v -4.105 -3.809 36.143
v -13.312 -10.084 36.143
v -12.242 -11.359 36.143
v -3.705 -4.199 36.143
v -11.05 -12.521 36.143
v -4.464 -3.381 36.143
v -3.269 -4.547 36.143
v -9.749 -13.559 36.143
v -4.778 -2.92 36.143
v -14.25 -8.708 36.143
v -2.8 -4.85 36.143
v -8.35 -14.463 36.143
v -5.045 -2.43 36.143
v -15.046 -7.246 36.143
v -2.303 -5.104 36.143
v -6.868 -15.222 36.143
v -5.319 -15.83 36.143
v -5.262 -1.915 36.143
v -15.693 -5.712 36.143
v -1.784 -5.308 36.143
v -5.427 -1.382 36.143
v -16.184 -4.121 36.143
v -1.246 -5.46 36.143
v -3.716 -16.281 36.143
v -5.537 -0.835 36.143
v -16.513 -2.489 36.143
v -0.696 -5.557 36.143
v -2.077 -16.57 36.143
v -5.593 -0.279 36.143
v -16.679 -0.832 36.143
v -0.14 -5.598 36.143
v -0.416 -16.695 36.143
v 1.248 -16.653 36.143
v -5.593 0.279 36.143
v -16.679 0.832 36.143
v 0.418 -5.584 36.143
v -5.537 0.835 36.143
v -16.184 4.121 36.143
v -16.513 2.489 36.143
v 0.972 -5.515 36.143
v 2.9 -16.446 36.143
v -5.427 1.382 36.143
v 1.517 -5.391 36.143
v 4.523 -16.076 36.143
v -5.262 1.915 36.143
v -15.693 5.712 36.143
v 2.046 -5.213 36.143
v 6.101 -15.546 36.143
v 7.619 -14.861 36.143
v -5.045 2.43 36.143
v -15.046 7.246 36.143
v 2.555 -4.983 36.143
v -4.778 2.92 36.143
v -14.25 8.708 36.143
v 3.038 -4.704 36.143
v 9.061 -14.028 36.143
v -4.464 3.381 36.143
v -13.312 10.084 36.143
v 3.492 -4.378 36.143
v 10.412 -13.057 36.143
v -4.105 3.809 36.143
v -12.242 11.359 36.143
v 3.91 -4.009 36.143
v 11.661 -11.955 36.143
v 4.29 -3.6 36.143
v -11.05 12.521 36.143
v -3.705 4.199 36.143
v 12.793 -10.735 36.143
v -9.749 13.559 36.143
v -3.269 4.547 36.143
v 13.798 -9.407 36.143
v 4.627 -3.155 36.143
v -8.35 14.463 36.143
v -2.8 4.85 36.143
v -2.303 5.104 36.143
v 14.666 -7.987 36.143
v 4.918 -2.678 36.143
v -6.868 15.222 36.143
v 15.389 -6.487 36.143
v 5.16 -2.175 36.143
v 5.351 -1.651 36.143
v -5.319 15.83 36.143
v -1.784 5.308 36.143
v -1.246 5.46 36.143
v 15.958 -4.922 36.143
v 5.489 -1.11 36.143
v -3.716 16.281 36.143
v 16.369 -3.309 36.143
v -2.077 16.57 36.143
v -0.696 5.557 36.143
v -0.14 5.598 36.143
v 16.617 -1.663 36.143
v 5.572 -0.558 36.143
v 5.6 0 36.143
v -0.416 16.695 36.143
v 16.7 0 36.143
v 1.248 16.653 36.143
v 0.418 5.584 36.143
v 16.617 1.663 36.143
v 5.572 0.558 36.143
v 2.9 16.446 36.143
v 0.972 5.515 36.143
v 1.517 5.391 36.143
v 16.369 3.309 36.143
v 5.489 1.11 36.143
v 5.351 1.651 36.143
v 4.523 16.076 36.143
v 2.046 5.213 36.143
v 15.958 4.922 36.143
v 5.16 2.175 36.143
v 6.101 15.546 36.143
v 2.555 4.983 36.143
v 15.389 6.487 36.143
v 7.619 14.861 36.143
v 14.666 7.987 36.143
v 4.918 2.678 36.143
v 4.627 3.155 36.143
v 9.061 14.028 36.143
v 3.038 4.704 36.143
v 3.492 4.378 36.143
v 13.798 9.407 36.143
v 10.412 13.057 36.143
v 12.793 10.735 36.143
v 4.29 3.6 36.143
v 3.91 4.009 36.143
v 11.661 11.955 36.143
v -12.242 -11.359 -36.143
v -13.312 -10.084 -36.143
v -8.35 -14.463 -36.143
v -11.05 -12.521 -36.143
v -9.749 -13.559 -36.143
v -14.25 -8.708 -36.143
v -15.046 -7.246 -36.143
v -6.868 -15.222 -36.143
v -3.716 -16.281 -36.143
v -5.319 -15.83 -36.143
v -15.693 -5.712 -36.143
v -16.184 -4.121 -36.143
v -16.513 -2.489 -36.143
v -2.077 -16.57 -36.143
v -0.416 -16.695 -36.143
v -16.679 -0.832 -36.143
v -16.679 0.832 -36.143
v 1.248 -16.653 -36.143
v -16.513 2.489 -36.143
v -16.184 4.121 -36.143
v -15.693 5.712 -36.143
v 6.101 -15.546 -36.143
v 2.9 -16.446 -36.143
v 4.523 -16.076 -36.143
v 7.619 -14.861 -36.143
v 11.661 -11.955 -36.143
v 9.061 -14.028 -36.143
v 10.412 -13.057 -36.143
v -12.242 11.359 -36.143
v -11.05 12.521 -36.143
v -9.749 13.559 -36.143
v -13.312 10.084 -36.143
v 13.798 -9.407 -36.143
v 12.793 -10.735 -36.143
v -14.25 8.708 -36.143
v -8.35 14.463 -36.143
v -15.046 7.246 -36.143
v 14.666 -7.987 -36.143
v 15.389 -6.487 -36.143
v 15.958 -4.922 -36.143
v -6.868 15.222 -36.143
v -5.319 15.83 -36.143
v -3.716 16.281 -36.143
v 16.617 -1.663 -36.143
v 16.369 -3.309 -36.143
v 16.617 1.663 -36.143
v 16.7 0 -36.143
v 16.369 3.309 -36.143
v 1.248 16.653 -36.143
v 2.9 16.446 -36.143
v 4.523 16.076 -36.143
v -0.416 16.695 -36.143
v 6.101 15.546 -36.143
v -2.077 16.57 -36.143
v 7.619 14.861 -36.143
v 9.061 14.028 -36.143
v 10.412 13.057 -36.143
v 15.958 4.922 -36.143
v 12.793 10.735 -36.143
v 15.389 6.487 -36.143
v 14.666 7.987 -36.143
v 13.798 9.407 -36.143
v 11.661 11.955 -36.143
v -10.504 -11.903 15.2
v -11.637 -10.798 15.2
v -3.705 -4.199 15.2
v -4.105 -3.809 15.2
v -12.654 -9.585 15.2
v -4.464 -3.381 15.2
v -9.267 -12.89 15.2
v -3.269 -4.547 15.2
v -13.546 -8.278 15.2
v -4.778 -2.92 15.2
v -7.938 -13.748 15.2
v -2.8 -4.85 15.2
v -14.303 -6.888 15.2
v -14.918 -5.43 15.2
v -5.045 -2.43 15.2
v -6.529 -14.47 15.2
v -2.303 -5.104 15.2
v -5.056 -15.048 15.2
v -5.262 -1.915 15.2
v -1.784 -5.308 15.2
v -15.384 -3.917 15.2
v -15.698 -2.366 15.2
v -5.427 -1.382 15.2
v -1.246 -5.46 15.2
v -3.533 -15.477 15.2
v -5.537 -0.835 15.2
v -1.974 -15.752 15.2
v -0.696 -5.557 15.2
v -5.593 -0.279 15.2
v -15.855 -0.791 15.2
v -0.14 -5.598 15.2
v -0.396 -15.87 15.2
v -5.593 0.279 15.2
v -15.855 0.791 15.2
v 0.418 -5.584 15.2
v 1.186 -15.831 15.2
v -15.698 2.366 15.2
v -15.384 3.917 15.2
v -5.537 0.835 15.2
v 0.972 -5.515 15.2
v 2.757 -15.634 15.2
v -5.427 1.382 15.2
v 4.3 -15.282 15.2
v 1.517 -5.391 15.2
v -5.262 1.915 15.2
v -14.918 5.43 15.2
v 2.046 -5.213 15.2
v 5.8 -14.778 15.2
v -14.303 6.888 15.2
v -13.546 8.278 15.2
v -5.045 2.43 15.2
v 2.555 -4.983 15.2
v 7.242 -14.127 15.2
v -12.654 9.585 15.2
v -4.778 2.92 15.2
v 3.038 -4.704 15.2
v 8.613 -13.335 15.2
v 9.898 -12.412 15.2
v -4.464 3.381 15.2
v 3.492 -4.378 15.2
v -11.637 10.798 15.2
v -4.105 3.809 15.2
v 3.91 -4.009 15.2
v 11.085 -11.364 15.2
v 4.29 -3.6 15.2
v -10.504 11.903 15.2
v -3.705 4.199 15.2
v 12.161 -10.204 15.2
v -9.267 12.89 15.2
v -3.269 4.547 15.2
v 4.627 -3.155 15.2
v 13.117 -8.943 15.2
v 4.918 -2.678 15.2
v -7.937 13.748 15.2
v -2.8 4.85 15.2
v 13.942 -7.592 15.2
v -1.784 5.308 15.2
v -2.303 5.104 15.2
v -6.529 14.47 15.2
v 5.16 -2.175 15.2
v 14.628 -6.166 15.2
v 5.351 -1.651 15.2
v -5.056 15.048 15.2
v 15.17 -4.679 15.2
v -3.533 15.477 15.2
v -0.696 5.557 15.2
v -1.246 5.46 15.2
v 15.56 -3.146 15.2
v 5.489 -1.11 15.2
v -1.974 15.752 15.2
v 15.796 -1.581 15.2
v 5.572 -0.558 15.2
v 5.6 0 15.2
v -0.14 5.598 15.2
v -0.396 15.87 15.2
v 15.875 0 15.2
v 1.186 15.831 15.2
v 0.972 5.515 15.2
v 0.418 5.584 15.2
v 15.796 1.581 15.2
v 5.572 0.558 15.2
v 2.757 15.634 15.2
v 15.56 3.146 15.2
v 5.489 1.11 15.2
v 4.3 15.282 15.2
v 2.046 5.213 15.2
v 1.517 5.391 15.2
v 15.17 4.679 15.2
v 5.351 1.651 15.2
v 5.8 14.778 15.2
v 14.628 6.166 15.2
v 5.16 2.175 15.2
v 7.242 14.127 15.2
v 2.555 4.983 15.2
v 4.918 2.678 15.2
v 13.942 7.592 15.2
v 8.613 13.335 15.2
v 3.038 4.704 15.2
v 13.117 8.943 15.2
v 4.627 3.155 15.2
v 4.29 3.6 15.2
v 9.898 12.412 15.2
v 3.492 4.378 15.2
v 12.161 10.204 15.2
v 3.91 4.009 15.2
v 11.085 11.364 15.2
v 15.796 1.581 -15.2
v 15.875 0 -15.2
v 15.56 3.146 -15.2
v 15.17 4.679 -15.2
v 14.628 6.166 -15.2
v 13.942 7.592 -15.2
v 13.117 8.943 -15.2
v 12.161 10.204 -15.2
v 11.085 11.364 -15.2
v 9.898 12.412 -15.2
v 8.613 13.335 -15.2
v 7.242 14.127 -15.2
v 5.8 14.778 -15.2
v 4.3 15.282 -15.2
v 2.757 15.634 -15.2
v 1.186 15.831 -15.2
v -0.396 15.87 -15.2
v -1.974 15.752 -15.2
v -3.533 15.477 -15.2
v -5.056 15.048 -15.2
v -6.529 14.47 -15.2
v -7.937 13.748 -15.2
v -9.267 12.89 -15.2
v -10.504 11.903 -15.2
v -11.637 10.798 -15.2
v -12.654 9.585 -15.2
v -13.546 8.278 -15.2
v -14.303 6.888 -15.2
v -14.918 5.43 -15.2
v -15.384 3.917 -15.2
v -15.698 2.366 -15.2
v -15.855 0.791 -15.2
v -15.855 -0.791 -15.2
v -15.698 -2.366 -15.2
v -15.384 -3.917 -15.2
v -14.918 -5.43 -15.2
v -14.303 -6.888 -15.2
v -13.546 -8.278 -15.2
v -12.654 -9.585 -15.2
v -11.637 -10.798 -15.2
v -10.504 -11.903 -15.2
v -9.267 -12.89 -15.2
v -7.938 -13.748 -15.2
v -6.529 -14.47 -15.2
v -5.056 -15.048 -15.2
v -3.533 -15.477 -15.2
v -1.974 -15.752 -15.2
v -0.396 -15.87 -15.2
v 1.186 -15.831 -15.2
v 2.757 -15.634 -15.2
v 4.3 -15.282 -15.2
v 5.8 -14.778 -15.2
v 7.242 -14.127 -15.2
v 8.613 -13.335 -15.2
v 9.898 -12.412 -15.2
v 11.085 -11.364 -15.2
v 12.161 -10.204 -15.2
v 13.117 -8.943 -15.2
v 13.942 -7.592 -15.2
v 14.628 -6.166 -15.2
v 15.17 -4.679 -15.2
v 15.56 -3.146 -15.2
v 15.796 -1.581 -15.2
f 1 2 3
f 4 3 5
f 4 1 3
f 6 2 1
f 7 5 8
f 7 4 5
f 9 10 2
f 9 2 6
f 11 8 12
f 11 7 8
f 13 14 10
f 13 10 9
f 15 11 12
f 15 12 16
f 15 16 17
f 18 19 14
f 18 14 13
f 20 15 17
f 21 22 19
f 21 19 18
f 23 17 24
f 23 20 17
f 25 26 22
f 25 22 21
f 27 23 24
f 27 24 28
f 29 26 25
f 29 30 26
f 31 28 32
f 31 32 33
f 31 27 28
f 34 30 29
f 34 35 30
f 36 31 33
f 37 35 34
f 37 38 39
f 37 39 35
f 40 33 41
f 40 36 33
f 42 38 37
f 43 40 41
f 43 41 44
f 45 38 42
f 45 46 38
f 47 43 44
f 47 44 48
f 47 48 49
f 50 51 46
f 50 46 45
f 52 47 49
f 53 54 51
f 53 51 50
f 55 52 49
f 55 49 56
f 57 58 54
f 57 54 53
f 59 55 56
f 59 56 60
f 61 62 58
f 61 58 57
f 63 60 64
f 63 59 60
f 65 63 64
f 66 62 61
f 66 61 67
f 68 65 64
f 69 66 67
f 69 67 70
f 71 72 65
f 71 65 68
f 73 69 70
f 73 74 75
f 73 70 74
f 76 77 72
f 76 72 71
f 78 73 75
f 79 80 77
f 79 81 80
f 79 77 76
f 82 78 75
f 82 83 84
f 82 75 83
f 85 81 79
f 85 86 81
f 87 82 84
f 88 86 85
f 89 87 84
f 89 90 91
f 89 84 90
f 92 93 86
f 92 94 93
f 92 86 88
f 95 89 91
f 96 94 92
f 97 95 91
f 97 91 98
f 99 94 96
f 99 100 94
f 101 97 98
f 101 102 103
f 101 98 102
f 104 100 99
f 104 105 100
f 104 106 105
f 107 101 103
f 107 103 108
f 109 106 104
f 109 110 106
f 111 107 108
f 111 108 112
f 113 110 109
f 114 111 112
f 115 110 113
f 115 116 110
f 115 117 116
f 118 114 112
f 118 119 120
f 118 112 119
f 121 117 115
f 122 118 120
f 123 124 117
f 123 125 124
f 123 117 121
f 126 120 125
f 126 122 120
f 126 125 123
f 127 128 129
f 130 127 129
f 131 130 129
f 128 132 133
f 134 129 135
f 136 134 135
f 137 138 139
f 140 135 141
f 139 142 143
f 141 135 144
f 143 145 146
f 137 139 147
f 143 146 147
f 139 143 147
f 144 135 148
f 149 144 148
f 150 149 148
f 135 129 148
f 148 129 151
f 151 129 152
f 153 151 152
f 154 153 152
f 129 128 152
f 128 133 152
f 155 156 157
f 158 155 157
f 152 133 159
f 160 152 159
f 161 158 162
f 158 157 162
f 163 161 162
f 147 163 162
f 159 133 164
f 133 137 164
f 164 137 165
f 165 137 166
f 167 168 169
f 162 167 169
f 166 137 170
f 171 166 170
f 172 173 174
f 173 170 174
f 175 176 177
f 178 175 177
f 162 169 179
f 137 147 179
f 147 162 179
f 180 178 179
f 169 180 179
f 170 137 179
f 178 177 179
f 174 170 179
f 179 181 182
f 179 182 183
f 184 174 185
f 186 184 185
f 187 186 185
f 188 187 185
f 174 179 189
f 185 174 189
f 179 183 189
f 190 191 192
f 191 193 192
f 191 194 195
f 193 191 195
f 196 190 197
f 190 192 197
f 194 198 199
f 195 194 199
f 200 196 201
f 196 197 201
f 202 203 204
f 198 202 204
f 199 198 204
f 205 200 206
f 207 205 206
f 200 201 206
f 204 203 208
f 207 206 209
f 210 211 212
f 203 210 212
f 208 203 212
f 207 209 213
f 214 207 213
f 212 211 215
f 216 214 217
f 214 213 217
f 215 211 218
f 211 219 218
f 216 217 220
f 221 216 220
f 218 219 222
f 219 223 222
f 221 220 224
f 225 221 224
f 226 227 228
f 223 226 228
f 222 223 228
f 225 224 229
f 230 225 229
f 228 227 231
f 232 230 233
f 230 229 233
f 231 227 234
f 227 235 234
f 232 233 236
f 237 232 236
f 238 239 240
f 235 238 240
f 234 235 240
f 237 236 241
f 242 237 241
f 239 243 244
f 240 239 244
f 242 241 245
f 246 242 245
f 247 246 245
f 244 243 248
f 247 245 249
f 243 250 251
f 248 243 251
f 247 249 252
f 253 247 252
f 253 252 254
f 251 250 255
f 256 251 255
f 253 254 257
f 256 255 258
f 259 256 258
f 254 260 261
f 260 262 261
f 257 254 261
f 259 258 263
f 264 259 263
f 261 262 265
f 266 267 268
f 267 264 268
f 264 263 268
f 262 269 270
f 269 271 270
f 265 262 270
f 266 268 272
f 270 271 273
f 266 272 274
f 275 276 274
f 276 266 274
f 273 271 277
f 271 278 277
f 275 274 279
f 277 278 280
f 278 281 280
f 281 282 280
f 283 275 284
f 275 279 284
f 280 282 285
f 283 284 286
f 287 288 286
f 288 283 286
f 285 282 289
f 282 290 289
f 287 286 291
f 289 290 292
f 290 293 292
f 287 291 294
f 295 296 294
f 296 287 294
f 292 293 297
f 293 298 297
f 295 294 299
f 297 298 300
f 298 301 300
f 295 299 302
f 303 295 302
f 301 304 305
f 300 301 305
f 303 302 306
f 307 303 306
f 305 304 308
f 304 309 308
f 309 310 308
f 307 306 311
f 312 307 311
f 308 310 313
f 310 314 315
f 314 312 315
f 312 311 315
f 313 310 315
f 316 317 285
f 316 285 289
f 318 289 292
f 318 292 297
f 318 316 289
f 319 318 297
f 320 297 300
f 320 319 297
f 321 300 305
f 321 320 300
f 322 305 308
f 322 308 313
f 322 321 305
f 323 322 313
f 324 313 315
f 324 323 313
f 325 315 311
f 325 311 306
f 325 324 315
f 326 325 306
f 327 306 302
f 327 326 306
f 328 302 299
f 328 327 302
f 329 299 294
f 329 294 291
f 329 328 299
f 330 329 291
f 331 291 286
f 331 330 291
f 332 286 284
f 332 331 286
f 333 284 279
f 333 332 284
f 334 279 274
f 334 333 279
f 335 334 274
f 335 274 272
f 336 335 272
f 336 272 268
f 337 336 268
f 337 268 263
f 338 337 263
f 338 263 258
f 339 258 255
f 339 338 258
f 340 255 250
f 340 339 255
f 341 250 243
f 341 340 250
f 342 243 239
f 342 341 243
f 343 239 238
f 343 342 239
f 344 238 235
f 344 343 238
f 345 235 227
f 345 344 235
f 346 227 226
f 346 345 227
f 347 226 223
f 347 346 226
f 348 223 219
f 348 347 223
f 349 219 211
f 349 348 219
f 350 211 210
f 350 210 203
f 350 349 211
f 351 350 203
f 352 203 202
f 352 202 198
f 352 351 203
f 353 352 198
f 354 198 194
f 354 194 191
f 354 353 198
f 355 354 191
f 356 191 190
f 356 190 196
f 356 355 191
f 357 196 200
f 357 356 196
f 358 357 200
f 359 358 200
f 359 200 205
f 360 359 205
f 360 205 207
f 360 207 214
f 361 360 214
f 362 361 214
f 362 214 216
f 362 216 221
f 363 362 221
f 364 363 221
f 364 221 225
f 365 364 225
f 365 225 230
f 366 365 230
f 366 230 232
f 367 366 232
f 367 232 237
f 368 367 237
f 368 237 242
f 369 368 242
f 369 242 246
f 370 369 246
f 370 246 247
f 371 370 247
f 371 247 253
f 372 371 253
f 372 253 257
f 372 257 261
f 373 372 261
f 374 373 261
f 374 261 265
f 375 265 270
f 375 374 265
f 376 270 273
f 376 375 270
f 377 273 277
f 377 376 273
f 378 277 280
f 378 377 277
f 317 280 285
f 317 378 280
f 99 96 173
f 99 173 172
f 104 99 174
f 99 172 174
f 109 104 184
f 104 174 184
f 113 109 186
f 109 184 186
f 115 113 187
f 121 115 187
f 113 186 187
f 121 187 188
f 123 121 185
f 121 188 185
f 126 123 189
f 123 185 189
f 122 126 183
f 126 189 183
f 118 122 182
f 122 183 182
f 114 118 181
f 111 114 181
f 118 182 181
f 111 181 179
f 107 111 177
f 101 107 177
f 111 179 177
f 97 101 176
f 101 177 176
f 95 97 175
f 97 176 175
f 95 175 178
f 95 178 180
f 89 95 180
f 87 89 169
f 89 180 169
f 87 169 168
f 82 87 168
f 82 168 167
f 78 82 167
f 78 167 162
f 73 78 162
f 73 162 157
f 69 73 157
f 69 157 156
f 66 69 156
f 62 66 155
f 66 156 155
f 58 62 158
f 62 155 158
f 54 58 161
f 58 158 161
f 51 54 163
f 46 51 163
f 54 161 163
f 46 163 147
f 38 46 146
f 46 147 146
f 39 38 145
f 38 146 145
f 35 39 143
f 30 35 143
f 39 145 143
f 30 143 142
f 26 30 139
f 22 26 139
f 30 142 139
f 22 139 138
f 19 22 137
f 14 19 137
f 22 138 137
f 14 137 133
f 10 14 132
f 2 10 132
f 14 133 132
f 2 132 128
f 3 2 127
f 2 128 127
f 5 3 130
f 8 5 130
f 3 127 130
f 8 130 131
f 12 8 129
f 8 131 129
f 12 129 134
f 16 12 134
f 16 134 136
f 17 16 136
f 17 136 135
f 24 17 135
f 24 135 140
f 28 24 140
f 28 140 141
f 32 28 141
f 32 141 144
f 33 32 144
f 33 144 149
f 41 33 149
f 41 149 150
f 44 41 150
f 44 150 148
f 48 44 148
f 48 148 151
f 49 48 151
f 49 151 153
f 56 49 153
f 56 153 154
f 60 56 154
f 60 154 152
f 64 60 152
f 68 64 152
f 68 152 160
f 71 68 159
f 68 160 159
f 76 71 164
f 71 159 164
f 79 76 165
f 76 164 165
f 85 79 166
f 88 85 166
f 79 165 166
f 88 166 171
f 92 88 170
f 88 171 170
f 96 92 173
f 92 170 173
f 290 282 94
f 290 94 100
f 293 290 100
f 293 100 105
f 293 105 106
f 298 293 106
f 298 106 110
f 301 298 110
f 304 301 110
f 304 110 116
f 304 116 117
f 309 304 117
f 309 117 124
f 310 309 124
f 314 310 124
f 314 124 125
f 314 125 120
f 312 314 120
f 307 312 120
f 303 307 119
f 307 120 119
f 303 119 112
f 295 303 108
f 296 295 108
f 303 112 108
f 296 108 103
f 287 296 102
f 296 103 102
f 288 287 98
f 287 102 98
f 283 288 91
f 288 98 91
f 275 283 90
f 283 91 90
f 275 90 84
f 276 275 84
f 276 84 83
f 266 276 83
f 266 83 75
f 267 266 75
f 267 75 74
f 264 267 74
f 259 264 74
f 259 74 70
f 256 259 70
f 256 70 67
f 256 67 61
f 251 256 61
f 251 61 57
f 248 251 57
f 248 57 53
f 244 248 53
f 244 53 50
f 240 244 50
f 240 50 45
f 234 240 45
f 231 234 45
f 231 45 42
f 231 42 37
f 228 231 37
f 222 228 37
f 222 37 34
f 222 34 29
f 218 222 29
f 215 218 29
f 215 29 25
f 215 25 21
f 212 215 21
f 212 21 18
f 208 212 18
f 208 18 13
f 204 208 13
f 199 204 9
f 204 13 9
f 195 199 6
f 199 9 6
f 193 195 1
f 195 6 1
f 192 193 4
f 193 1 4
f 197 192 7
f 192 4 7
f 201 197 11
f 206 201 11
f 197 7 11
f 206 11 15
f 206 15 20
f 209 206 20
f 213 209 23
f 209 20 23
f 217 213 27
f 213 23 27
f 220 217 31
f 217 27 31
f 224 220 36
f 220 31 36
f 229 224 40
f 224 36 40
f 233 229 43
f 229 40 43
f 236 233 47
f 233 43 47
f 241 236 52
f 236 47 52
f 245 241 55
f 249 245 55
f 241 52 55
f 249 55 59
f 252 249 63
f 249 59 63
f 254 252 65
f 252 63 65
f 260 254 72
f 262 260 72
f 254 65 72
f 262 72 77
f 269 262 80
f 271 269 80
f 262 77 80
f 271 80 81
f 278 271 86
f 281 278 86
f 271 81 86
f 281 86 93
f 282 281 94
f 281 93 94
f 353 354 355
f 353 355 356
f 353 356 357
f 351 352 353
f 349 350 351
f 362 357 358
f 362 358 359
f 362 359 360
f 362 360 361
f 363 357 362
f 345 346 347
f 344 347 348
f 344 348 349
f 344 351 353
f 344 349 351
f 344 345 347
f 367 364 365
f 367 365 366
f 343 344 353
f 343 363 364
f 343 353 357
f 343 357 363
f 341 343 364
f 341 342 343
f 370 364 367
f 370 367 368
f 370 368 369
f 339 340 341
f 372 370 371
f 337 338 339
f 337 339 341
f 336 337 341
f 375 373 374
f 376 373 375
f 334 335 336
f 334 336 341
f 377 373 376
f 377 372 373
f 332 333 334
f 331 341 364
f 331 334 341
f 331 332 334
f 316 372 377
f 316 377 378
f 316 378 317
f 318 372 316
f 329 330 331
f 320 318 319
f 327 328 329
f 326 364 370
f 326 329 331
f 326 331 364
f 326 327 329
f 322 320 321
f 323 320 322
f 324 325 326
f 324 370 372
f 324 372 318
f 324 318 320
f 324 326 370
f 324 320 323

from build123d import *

# Parameters (mm, degrees)
EXTRUDE1_DEPTH       = 36.143
EXTRUDE1_DEPTH_BACK  = 36.143
SKETCH1_R            = 16.7
STROKE_START         = -15.2
SKETCH2_R            = 15.875
STROKE_CHAMBER_DEPTH = 30.4
ROD_HOLE_REACH       = 78.046
SKETCH3_R            = 5.6


with BuildPart() as part:
    # Sketch1 → Extrude1 (new, two sides: drawn at the far end of the back side and taken through both)
    with BuildSketch(Plane.XY.offset(-EXTRUDE1_DEPTH_BACK)):
        Circle(SKETCH1_R)
    extrude(amount=EXTRUDE1_DEPTH + EXTRUDE1_DEPTH_BACK)

    # Sketch2 → STROKE CHAMBER (cut)
    with BuildSketch(Plane.XY.offset(STROKE_START)):
        Circle(SKETCH2_R)
    extrude(amount=STROKE_CHAMBER_DEPTH, mode=Mode.SUBTRACT)

    # Sketch3 → ROD HOLE (cut, up to next)
    with BuildSketch(Plane.XY.offset(36.143), mode=Mode.PRIVATE) as rod_hole_sk1:
        Circle(SKETCH3_R)
    rod_hole_tool1 = extrude(rod_hole_sk1.sketch, amount=-ROD_HOLE_REACH, mode=Mode.PRIVATE) & part.part
    add(rod_hole_tool1.solids().sort_by_distance((0, 0, 36.143))[0], mode=Mode.SUBTRACT)


solid = part.part
